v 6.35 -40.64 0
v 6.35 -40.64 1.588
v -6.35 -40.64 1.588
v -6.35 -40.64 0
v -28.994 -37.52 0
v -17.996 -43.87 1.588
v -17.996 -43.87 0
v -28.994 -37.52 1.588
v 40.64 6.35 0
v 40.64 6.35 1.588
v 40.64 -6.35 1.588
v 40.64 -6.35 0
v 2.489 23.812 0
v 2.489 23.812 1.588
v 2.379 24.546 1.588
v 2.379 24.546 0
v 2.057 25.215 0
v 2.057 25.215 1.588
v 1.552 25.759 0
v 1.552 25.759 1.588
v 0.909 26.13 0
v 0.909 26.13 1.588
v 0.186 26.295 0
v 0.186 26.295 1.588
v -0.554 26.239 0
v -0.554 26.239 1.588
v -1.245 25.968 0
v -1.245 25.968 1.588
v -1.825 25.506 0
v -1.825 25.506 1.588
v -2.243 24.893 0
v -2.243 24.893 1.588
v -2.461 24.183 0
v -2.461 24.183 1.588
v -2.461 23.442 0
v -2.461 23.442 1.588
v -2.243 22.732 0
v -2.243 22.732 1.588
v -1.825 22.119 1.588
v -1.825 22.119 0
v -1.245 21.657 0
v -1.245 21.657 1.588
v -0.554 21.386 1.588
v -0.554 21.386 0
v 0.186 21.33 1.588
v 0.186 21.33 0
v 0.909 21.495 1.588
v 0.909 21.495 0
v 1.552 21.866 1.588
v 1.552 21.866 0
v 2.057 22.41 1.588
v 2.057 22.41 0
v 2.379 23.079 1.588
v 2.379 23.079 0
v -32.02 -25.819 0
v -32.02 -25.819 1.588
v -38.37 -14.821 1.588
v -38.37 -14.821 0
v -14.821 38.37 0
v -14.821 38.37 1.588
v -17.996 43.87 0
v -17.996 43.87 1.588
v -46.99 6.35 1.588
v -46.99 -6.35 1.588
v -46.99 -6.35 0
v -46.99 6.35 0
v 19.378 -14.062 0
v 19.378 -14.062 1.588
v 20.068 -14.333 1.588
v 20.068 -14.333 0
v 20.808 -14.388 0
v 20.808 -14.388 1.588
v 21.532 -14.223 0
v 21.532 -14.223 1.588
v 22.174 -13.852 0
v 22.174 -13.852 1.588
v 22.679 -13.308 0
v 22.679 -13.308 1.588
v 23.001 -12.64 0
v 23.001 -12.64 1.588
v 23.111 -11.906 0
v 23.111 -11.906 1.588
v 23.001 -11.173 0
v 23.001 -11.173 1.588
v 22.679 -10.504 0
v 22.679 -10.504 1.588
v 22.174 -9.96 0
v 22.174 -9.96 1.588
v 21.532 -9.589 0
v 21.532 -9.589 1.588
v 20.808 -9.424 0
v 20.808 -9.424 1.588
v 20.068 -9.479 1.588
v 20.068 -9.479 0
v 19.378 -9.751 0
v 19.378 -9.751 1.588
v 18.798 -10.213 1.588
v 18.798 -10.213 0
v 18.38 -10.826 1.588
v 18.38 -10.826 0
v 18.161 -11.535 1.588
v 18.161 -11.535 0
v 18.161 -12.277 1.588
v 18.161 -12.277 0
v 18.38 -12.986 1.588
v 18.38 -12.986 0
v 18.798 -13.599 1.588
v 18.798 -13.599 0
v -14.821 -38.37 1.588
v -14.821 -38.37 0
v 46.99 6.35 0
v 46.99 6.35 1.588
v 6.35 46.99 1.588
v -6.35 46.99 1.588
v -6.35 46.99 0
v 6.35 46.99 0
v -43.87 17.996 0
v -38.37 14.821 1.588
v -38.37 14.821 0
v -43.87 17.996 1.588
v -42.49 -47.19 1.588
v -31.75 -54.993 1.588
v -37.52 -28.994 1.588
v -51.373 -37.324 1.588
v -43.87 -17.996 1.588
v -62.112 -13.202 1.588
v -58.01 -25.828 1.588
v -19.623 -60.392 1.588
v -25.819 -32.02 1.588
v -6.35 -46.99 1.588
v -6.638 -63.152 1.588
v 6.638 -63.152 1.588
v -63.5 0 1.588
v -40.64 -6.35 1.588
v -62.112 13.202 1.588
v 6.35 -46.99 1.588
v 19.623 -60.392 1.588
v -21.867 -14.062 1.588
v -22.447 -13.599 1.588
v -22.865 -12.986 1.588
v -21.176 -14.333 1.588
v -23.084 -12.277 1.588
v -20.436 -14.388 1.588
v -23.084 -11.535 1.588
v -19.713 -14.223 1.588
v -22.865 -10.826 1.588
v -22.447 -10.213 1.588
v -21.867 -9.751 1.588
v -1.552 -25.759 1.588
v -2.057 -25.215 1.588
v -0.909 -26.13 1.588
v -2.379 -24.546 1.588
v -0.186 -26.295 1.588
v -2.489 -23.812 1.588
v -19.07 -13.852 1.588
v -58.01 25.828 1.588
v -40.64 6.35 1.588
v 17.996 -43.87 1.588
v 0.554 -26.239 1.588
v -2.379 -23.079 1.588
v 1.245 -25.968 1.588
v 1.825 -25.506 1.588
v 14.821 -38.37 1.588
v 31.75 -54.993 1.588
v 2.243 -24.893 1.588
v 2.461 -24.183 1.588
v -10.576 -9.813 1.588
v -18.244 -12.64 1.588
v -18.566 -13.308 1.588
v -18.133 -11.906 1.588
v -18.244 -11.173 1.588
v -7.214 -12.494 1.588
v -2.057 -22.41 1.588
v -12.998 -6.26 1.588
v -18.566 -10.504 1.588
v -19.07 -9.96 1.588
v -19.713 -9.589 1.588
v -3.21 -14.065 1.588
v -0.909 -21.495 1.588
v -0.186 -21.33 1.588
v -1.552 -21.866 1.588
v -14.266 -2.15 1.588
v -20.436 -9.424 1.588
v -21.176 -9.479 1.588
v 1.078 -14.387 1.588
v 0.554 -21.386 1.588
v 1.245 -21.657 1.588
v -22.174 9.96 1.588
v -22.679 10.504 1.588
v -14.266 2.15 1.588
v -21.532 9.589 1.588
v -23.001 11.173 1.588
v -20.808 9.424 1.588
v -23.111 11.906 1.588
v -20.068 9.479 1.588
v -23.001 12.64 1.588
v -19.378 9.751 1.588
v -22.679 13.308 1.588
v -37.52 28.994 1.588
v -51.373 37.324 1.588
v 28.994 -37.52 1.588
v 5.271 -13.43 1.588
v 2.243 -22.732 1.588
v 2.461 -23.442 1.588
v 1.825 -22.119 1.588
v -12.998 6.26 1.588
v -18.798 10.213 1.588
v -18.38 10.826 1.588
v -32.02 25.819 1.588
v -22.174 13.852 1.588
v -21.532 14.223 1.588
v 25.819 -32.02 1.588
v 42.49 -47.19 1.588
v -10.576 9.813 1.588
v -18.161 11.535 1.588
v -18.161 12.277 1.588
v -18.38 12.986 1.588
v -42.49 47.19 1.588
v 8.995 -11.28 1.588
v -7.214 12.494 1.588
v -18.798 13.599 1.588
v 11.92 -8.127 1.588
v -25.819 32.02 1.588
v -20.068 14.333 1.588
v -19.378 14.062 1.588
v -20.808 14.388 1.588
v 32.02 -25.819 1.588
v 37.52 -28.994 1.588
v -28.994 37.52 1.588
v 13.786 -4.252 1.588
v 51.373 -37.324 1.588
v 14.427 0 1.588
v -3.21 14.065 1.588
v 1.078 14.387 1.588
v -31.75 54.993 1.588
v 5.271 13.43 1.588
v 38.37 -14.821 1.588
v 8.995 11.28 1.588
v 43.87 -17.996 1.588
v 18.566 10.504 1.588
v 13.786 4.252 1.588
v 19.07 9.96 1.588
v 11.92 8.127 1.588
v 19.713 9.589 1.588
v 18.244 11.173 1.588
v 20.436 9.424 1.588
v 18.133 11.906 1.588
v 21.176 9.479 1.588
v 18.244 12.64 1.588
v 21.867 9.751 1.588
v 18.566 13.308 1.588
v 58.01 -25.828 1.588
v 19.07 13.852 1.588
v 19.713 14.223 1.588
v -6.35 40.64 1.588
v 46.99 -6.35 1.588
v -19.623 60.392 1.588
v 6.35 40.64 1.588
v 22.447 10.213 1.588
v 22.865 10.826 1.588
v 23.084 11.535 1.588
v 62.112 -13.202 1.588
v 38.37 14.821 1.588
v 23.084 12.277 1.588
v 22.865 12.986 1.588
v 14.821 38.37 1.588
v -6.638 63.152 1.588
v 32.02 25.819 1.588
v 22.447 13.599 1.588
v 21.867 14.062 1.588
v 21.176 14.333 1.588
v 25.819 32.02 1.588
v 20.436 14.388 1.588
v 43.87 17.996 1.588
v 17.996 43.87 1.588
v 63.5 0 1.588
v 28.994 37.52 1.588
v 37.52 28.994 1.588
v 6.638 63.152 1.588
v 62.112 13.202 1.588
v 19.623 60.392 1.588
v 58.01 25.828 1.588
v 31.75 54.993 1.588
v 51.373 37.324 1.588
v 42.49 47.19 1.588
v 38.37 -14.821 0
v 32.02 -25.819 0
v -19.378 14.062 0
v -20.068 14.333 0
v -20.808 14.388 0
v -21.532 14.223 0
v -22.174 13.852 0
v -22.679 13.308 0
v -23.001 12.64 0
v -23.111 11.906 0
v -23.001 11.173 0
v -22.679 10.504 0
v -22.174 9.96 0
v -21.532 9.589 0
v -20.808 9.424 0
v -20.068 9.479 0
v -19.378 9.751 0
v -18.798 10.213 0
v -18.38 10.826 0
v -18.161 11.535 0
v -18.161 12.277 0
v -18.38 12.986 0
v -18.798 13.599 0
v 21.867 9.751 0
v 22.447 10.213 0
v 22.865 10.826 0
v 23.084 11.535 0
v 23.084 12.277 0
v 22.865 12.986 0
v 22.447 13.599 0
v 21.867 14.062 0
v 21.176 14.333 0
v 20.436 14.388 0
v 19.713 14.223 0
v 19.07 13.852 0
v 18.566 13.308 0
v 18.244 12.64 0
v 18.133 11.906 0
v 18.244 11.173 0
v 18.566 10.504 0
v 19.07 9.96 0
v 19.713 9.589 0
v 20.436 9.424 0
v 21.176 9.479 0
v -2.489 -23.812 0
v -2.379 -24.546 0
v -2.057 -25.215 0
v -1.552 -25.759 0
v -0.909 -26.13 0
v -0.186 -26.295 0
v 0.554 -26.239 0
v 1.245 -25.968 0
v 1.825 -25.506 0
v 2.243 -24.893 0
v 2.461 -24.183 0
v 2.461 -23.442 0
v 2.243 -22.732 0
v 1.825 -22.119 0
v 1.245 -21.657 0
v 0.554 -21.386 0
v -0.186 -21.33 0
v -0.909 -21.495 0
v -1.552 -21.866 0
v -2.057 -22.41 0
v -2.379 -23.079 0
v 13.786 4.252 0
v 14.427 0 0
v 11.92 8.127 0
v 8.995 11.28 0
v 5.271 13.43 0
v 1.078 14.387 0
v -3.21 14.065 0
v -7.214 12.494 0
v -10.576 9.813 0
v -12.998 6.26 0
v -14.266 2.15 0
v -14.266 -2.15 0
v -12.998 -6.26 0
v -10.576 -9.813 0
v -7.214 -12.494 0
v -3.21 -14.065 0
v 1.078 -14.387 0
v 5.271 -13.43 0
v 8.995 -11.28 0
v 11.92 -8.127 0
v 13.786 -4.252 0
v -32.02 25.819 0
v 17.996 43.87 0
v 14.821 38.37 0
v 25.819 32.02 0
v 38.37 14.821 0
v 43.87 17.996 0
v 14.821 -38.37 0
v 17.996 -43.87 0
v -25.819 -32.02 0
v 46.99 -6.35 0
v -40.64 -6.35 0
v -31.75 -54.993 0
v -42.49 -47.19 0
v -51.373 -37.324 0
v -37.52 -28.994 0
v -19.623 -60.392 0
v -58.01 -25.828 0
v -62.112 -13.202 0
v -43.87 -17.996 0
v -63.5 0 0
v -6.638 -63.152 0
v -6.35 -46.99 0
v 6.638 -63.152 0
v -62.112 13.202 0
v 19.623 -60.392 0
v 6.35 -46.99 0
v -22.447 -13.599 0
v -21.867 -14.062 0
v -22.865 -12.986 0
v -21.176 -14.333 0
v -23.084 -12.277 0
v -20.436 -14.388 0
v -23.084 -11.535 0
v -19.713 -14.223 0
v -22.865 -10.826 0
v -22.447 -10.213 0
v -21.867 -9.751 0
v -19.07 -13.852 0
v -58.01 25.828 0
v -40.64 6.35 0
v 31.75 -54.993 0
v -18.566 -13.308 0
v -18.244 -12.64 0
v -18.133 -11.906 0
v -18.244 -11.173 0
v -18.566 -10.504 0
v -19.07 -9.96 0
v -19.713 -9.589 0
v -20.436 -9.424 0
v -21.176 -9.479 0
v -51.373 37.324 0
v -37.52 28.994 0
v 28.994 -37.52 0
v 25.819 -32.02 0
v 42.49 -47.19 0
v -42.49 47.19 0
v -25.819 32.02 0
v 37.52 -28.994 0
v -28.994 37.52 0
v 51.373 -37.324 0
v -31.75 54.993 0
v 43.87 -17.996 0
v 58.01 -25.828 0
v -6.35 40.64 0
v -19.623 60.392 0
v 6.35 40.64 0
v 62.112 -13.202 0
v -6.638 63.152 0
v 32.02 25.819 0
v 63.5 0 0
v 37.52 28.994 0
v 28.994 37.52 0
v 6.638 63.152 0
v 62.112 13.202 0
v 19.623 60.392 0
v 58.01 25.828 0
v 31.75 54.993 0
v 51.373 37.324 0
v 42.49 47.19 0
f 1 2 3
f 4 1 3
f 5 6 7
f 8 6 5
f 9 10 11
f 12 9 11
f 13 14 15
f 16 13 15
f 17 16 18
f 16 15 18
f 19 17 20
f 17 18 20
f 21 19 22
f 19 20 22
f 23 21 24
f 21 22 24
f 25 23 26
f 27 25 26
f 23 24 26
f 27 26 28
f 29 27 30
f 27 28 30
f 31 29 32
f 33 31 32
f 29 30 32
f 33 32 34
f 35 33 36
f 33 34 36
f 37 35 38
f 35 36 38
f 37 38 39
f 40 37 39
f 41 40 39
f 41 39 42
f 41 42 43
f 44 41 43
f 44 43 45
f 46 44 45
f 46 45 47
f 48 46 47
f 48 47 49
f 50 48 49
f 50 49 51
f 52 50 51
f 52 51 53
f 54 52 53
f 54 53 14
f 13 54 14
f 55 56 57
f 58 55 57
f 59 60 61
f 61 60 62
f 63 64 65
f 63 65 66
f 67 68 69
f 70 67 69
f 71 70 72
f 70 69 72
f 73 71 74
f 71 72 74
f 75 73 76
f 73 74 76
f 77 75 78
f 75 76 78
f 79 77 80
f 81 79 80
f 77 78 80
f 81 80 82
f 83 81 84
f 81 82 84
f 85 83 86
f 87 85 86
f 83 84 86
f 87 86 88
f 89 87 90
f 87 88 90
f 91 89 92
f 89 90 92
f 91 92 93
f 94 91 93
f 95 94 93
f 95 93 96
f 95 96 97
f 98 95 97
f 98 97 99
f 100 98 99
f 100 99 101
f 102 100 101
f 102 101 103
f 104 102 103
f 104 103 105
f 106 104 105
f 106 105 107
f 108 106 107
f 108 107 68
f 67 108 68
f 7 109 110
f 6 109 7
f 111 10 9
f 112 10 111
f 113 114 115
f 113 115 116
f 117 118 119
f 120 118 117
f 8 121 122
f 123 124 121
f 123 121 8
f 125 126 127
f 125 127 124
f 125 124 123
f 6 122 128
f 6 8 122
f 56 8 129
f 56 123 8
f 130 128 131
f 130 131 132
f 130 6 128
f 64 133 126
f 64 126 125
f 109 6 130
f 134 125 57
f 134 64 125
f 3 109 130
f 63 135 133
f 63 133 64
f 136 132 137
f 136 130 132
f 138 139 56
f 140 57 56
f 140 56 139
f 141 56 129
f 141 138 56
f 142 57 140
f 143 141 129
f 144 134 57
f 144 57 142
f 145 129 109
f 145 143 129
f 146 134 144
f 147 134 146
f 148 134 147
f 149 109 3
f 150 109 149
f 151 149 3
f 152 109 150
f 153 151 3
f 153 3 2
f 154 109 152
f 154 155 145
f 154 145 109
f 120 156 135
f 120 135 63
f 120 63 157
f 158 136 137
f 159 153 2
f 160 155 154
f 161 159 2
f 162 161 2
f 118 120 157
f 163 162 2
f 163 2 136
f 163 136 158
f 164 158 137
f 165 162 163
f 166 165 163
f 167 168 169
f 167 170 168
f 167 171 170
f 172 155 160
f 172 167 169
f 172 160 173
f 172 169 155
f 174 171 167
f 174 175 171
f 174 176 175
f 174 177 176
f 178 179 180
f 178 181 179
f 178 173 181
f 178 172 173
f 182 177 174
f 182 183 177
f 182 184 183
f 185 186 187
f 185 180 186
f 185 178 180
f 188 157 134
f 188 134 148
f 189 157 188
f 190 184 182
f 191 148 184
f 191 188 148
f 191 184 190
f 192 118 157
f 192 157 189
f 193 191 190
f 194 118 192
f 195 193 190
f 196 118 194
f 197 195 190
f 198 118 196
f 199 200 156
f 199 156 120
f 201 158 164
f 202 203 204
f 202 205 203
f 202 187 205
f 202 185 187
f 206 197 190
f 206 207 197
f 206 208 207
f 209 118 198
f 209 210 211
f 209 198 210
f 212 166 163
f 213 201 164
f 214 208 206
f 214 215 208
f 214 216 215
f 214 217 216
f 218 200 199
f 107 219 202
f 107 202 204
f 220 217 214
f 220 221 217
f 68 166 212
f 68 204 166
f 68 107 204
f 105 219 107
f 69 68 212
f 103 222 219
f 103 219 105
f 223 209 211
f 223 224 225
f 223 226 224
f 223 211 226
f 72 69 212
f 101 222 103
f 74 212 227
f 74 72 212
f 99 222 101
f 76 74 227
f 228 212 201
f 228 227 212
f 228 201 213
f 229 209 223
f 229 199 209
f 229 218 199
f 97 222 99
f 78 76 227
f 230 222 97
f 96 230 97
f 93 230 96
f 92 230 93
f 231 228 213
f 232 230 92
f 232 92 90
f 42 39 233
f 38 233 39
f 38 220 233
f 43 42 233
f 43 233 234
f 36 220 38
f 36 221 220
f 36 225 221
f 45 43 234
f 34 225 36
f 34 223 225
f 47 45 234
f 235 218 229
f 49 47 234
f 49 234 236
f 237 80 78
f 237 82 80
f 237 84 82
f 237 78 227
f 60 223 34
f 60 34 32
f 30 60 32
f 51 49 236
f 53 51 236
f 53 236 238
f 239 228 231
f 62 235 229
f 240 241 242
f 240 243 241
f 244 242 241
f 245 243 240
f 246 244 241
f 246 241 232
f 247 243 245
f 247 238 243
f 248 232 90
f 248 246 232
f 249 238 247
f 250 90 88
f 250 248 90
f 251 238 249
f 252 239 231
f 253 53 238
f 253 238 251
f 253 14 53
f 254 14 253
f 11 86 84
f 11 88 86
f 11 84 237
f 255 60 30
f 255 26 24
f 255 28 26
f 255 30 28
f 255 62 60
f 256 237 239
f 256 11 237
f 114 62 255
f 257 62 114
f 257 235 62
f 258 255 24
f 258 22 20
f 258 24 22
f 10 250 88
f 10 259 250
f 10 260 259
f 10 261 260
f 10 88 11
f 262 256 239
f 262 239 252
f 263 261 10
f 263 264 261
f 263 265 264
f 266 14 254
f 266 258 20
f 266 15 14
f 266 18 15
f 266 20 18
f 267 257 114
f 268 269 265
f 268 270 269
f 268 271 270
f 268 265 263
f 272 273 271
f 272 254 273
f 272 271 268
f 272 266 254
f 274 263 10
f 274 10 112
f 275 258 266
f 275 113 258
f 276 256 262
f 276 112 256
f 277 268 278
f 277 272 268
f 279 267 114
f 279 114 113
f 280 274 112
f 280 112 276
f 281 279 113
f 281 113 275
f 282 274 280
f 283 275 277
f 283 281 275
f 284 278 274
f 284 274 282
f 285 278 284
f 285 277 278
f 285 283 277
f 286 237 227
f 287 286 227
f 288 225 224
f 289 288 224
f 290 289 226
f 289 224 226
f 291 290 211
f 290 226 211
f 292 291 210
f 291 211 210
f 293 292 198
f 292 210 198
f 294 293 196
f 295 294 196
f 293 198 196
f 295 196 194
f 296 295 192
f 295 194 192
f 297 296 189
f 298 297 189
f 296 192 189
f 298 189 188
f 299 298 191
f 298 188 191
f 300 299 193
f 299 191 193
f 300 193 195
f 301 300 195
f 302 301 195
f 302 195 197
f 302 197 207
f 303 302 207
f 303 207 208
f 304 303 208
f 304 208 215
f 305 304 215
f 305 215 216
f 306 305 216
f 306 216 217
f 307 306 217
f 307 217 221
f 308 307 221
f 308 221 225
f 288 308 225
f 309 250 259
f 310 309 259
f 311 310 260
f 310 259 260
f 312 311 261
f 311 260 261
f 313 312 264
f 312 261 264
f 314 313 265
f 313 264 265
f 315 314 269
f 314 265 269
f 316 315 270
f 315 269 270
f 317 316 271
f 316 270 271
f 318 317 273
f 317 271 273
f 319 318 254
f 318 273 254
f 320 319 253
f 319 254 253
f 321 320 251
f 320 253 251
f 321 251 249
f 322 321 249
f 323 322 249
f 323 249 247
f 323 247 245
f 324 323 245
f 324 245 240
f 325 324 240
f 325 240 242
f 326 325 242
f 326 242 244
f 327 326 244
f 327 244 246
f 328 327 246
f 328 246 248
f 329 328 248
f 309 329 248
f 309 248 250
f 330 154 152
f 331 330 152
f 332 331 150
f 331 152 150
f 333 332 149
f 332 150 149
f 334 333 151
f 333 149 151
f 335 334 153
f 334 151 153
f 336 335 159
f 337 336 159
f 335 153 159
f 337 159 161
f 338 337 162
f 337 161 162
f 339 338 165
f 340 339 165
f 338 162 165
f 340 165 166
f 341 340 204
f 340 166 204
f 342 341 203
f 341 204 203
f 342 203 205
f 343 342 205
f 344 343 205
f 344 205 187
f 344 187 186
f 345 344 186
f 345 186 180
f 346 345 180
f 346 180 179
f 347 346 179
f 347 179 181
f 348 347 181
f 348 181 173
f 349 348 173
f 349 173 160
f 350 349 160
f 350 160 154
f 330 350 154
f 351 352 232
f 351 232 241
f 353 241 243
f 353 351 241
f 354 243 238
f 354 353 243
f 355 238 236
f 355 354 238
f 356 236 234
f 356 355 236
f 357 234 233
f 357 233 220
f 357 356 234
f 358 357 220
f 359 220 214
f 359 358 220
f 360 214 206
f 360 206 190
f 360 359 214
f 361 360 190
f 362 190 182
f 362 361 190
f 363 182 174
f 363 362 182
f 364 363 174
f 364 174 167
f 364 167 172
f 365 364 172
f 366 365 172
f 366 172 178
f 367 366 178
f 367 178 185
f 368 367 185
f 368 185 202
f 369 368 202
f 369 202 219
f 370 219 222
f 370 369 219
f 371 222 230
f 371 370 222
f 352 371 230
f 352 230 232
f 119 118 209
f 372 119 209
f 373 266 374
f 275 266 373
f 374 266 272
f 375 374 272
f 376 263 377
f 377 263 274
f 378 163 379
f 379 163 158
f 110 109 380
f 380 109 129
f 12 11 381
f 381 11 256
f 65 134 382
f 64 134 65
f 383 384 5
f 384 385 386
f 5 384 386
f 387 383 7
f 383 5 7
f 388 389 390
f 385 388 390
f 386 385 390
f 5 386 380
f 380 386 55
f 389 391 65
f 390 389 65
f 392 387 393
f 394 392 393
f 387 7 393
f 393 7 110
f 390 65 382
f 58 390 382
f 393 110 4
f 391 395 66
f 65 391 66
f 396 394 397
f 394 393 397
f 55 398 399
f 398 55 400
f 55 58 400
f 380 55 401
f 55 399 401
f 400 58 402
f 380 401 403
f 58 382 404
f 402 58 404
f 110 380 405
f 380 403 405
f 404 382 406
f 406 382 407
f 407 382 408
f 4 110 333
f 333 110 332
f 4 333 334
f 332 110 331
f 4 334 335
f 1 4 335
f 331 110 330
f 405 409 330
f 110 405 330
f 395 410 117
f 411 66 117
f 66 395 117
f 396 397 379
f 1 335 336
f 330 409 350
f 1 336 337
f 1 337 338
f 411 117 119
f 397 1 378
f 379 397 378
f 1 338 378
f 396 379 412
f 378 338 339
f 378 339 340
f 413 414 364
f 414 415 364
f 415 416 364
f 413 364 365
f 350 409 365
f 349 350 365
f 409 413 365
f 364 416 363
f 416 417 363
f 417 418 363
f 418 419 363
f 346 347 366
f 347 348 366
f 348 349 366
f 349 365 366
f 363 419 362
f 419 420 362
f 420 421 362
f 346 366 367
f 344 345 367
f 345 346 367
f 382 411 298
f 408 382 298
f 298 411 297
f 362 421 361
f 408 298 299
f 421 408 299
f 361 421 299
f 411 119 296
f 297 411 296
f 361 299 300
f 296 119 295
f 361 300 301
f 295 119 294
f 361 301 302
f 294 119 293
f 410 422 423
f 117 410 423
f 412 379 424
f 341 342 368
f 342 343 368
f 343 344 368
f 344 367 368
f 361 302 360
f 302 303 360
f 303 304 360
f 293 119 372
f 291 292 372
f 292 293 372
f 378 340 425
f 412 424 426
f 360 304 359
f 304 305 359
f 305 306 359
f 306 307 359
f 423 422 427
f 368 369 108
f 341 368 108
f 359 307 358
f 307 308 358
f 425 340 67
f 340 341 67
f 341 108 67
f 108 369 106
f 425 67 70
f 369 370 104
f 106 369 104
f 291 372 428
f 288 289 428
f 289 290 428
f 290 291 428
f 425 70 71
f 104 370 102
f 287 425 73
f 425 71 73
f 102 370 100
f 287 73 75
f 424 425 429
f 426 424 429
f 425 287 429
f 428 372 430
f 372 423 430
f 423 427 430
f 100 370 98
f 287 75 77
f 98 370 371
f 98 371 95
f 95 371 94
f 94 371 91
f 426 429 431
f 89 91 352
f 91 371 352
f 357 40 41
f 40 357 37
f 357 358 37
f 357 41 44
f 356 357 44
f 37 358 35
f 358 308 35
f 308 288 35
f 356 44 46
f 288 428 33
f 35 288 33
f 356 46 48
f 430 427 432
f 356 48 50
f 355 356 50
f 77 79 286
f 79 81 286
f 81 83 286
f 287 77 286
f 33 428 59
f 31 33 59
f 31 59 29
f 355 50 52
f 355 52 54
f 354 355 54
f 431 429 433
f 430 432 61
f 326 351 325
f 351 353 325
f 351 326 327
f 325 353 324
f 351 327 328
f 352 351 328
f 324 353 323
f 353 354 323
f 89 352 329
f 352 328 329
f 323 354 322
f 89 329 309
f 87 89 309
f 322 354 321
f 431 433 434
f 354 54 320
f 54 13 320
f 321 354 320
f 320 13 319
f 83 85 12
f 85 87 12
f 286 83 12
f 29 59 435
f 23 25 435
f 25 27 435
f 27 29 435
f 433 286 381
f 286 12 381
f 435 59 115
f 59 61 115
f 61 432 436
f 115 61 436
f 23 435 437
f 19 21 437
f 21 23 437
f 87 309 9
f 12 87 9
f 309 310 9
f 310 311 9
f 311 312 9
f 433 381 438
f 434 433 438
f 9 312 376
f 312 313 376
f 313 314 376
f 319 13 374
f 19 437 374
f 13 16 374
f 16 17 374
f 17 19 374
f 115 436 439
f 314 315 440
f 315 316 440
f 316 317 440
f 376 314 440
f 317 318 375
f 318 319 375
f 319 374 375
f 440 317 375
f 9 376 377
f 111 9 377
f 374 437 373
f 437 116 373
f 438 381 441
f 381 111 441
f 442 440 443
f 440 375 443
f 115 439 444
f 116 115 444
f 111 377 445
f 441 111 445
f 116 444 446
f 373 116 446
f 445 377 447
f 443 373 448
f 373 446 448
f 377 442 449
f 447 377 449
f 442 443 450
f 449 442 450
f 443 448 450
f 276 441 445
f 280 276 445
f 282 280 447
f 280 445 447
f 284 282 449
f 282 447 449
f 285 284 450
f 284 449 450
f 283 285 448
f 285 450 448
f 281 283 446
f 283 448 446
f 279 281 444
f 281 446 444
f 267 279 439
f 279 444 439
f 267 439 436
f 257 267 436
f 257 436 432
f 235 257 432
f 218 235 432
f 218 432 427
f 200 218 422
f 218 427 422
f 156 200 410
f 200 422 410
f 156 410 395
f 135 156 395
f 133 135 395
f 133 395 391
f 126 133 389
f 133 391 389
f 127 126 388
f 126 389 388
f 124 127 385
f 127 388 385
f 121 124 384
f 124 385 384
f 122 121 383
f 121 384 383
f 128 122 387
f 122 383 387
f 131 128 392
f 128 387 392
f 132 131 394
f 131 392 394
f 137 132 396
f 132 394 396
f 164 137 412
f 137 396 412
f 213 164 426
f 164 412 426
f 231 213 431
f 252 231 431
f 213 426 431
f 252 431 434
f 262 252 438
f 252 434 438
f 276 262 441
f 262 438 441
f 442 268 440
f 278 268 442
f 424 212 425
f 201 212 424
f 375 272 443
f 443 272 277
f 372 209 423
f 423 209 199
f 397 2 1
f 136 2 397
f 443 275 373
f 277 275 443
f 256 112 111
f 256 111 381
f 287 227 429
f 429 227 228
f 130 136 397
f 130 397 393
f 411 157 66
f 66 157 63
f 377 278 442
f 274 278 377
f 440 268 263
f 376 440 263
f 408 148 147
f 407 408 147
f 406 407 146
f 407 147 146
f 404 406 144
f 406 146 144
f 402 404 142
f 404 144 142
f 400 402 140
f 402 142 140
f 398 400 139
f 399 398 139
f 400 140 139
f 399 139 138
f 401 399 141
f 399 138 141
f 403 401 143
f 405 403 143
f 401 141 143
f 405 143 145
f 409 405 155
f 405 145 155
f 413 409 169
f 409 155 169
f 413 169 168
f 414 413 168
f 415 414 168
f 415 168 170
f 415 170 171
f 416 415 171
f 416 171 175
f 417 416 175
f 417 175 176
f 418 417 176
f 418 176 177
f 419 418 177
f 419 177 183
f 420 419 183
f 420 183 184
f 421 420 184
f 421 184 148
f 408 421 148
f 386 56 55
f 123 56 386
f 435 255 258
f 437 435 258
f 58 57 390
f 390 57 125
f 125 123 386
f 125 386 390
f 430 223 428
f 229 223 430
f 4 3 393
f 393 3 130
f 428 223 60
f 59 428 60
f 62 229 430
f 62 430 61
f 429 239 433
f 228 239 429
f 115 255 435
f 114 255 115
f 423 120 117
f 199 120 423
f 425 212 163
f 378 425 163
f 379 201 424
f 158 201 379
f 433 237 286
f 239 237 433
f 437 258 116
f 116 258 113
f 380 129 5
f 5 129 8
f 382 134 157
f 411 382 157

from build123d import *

# Parameters (mm, degrees)
F0_R            = 63.5
F0_R_2          = 14.4272
F1_DEPTH        = 1.5875
F2_W            = 12.7
F2_H            = 6.35
F3_DEPTH        = 1.5885
F3_COPIES_COUNT = 12
F4_R            = 2.4892
F5_DEPTH        = 1.5885
F5_COPIES_COUNT = 6


# Not quite as in the source:
# - a pattern or mirror of a feature is missing from the dataset's text; its kind, count and spacing are read off the source's solid


with BuildPart() as f1:
    # F0 (on Top) → F1 (new body)
    with BuildSketch(Plane.XY):
        Circle(F0_R)
        Circle(F0_R_2, mode=Mode.SUBTRACT)
    extrude(amount=F1_DEPTH)

    # F2 (on face) → F3 (cut, through all)
    with BuildSketch(Plane.XY.offset(1.5875)):
        with Locations((0, 43.815)):
            Rectangle(F2_W, F2_H)
    f3 = extrude(amount=-F3_DEPTH, mode=Mode.SUBTRACT)

    # F3_copies: F3 ×12 about axis
    f3_copies_axis = Axis((0, 0, 0), (0, 0, 1))
    for i in range(1, F3_COPIES_COUNT):
        add(f3.rotate(f3_copies_axis, i * 360 / F3_COPIES_COUNT), mode=Mode.SUBTRACT)

    # F4 (on face) → F5 (cut, through all)
    with BuildSketch(Plane.XY.offset(1.5875)):
        with Locations((0, 23.8125)):
            Circle(F4_R)
    f5 = extrude(amount=-F5_DEPTH, mode=Mode.SUBTRACT)

    # F5_copies: F5 ×6 about axis
    f5_copies_axis = Axis((0, 0, 0), (0, 0, 1))
    for i in range(1, F5_COPIES_COUNT):
        add(f5.rotate(f5_copies_axis, i * 360 / F5_COPIES_COUNT), mode=Mode.SUBTRACT)


solid = f1.part
